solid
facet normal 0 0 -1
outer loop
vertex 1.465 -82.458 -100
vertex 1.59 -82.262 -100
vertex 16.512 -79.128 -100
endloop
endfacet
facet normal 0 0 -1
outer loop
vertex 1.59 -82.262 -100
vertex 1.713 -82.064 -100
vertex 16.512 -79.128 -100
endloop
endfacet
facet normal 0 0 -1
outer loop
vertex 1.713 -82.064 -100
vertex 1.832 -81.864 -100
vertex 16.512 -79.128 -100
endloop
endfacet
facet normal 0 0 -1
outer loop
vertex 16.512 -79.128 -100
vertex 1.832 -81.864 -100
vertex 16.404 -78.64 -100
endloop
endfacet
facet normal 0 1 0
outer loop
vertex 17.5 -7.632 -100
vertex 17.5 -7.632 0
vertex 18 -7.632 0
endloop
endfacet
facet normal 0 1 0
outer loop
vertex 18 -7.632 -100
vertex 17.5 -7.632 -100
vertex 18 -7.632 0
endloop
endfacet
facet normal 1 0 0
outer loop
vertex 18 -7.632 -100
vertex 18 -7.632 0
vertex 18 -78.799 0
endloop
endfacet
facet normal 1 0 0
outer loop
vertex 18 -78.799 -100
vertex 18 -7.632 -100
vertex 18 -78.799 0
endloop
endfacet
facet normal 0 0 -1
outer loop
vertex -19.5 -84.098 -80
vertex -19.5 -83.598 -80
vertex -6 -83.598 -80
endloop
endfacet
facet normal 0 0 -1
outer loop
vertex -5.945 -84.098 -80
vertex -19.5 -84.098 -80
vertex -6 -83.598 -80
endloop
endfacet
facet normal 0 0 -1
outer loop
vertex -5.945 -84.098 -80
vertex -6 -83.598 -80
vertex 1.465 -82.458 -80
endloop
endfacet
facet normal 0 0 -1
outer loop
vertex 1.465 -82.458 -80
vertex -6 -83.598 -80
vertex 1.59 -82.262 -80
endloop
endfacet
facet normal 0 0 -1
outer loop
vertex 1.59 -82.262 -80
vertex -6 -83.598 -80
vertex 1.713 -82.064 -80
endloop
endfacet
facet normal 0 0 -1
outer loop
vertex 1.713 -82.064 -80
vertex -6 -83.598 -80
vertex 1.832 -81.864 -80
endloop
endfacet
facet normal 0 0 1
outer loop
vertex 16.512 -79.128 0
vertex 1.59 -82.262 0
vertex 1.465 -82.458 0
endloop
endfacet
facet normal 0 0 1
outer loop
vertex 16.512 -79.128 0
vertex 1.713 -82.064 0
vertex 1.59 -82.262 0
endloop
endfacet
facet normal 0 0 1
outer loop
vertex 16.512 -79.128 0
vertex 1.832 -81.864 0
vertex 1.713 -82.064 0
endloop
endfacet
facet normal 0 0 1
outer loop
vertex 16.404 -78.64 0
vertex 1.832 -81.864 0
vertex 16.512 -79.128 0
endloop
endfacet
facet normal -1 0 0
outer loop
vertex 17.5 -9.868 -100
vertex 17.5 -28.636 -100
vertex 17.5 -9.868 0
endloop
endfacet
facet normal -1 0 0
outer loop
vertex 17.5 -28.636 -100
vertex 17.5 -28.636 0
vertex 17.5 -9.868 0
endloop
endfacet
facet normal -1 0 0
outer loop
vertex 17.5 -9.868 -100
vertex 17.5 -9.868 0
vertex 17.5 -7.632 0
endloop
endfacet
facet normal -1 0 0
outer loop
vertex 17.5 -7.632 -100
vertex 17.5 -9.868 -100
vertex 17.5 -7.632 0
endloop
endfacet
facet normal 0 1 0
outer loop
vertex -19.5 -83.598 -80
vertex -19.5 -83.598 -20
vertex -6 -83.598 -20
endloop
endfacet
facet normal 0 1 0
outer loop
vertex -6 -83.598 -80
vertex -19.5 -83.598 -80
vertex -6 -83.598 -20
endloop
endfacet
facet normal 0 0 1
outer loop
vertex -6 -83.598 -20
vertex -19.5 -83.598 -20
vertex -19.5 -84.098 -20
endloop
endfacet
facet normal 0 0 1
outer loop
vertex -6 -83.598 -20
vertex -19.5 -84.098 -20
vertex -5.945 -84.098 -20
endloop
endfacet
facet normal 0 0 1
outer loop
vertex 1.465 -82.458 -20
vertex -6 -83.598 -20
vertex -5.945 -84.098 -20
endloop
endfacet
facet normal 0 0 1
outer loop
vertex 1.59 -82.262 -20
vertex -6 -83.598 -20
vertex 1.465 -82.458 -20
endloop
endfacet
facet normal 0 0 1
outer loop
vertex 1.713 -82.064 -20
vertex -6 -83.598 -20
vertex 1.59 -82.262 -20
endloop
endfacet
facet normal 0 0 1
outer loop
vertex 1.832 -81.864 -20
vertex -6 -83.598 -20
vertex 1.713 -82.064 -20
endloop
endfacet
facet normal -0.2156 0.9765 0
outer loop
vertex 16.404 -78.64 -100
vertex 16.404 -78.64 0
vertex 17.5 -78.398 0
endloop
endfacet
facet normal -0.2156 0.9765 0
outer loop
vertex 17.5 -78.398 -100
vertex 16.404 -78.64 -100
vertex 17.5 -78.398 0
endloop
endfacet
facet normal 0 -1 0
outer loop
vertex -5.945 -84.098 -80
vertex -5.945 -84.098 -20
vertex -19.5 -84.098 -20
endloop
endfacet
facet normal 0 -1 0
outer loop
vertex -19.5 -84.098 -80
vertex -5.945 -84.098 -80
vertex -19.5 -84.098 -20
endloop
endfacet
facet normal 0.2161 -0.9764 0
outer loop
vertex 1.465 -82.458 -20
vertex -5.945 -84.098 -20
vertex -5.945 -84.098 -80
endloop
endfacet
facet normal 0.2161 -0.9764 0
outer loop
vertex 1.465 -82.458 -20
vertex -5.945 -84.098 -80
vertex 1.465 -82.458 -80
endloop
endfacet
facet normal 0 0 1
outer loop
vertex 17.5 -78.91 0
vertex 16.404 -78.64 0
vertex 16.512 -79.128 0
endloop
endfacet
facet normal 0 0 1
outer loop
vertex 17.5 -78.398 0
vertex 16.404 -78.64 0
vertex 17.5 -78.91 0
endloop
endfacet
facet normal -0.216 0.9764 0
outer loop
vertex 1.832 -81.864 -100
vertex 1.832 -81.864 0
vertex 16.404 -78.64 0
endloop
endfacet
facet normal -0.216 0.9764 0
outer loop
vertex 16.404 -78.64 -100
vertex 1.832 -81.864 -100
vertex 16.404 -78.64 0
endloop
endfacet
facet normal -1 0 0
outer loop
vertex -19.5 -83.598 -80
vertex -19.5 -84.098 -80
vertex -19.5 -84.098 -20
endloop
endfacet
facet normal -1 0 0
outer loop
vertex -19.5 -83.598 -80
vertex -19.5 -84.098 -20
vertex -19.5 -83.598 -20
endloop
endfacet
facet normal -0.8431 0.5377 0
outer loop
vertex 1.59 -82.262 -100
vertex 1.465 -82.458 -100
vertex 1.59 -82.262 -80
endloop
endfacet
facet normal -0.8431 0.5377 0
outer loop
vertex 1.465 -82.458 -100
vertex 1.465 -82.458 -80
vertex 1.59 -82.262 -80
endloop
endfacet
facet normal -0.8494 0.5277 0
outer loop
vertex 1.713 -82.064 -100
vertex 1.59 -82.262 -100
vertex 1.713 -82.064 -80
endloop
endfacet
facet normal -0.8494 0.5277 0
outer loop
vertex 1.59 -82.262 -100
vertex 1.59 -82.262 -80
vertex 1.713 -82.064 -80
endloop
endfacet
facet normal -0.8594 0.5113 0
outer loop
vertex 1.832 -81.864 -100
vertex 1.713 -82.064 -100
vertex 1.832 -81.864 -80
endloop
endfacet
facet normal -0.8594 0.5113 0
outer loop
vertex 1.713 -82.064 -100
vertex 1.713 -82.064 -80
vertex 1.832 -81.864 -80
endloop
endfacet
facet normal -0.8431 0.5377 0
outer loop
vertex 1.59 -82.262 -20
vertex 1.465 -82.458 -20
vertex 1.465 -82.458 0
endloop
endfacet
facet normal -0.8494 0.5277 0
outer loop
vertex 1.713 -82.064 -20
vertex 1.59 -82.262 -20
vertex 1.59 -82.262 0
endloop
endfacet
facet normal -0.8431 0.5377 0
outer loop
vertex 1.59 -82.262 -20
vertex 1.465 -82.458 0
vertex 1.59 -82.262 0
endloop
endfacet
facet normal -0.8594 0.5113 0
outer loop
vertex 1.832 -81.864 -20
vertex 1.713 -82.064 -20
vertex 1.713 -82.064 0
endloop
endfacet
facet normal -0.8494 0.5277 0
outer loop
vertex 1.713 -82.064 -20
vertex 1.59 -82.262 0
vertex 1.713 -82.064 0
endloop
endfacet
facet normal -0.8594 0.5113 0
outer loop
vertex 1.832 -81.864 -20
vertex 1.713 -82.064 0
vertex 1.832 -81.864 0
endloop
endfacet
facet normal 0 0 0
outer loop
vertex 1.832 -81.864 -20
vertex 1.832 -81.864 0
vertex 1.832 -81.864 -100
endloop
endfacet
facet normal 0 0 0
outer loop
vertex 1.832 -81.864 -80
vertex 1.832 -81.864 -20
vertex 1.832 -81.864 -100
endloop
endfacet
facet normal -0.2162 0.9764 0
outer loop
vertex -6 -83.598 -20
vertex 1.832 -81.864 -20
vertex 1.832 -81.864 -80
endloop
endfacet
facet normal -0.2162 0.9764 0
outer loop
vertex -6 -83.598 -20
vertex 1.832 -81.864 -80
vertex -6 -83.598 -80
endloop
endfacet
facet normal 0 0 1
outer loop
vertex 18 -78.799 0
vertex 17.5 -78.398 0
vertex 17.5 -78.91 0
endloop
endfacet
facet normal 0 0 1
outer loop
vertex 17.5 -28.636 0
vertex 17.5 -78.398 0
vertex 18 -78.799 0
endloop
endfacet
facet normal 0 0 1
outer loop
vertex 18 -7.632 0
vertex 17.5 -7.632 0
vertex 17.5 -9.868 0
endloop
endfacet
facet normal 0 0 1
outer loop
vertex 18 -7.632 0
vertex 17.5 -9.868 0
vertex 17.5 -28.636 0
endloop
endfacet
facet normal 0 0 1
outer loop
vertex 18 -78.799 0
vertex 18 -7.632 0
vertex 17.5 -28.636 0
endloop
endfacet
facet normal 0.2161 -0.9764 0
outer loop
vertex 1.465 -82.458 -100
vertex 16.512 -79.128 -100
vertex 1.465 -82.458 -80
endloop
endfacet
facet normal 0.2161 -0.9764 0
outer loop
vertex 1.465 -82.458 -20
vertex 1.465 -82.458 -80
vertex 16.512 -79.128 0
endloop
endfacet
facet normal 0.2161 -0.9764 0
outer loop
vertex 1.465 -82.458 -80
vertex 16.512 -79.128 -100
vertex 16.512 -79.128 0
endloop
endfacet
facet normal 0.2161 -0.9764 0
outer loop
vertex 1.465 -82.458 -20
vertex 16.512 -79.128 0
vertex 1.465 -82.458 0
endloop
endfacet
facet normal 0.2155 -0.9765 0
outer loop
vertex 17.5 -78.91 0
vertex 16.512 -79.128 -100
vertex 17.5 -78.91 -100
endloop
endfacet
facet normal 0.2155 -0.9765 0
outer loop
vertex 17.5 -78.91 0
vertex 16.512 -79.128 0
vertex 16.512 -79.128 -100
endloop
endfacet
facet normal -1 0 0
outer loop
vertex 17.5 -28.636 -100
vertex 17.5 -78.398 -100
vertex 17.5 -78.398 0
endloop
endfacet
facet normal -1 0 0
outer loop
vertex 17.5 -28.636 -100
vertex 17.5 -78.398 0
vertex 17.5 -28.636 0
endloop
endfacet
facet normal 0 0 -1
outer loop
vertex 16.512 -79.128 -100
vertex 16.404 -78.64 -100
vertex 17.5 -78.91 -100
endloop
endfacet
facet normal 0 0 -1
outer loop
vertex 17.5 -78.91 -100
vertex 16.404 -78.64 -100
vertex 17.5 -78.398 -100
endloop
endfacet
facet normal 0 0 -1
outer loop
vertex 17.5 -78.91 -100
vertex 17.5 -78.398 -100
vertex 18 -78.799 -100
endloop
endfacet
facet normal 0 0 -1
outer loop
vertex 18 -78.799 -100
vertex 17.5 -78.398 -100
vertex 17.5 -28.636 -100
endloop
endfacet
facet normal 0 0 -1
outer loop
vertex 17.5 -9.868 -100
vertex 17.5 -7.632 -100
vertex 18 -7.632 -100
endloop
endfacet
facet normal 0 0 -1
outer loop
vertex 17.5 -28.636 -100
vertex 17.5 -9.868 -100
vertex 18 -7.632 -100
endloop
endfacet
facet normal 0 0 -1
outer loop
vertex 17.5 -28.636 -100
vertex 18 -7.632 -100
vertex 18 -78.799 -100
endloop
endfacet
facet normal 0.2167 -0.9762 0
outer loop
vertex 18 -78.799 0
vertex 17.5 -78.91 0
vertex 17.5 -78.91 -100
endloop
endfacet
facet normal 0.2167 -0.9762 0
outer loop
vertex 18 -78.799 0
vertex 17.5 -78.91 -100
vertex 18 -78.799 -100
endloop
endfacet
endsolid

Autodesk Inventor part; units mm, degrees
ref_plane "YZ Plane" through (0, 0, 0) normal (1, 0, 0) x (0, 1, 0)
ref_plane "XZ Plane" through (0, 0, 0) normal (0, 1, 0) x (-1, 0, 0)
ref_plane "XY Plane" through (0, 0, 0) normal (0, 0, 1) x (1, 0, 0)
sketch "Sketch1" plane through (0, 0, 0) normal (0, 0, 1) x (1, 0, 0)
  line L0 (-17.5, 7.6319) -> (17.5, -9.8679) projected
  line L1 (17.5, -9.8679) -> (17.5, -7.6319) projected
  line L2 (17.5, -7.6319) -> (-17.5, 9.8679) projected
  line L3 (-17.5, 9.8679) -> (-17.5, 7.6319) projected
  line L4 (-7.5, -29.4219) -> (-3.6225, -29.4219) projected
  arc A0 (-1.9153, -30.38) -> (-3.6225, -29.4219) centre (-3.6225, -31.4219) ccw projected
  line L5 (-1.9153, -30.38) -> (2.2072, -37.135) projected
  arc A1 (2.5, -38.1769) -> (2.2072, -37.135) centre (0.5, -38.1769) ccw projected
  line L6 (2.5, -38.1769) -> (2.5, -47.4219) projected
  arc A2 (0.5, -49.4219) -> (2.5, -47.4219) centre (0.5, -47.4219) ccw projected
  line L7 (0.5, -49.4219) -> (-7.5, -49.4219) projected
  line L8 (-7.5, -49.4219) -> (-7.5, -29.4219) projected
  spline S0 degree 3 poles (6.0485, -14.3337) (6.0213, -14.5971) (5.9428, -14.8528) (5.6929, -15.3183) (5.524, -15.5241) (5.1467, -15.8339) (4.9505, -15.9462) (4.5292, -16.1007) (4.3073, -16.1418) (4.0832, -16.1449) knots 0 0 0 0 0.079442 0.079442 0.158531 0.158531 0.225919 0.225919 0.293184 0.293184 0.293184 0.293184 projected
  line L9 (6.0485, -14.3337) -> (6.563, -9.3583) projected
  line L10 (6.563, -9.3583) -> (6.8849, -5.9915) projected
  arc A3 (6.8849, -5.9915) -> (5.7884, -4.0122) centre (4.894, -5.8011) ccw projected
  line L11 (-17.5, 7.6319) -> (5.7884, -4.0122) projected
  line L12 (-17.5, -57.5975) -> (-17.5, 7.6319) projected
  arc A4 (-4.376, -58.868) -> (-17.5, -57.5975) centre (-12.5, -74.368) ccw projected
  arc A5 (1.8324, -81.8643) -> (-4.376, -58.868) centre (-12.5, -73.3975) ccw projected
  line L13 (17.5, -78.3975) -> (17.5, -28.6365) projected
  ellipse E0 centre (15.5, -28.6365) end of major axis (15.5, -26.6191) minor radius 2 (17.5, -28.6365) -> (15.6888, -26.6281) ccw projected
  line L14 (15.6888, -26.6281) -> (3.1949, -25.4333) projected
  line L15 (3.1949, -25.4333) -> (4.0832, -16.1449) projected
  circle A6 centre (12, -52.3461) radius 1.25 projected
  circle A7 centre (-5.3255, -52.3461) radius 1.25 projected
  line L16 (14, -34.918) -> (10, -34.918) projected
  line L17 (14, -41.318) -> (14, -34.918) projected
  line L18 (10, -41.318) -> (14, -41.318) projected
  line L19 (10, -34.918) -> (10, -41.318) projected
  line L20 (-13.7851, -31.6782) -> (-9.7851, -31.6782) projected
  line L21 (-13.7851, -25.2782) -> (-13.7851, -31.6782) projected
  line L22 (-9.7851, -25.2782) -> (-13.7851, -25.2782) projected
  line L23 (-9.7851, -31.6782) -> (-9.7851, -25.2782) projected
  circle A8 centre (-7.1425, -17.0027) radius 1.25 projected
  line L24 (-19.5, -83.5975) -> (-17.5, -83.5975) projected
  line L25 (-17.5, -57.5975) -> (-17.5, -83.5975) projected
  line L26 (-19.5, -57.5975) -> (-17.5, -57.5975) projected
  line L27 (-19.5, -57.5975) -> (-19.5, -83.5975) projected
  line L28 (-12.5, -83.5975) -> (-17.5, -83.5975) projected
  arc A9 (-12.5, -83.5975) -> (-6.9024, -81.9243) centre (-12.5, -73.3975) ccw projected
  line L29 (17.5, -7.6319) -> (18, -7.6319)
  line L30 (18, -7.6319) -> (18, -79.7438)
  line L31 (18, -79.7438) -> (17.5, -79.7438)
  line L32 (17.5, -79.7438) -> (17.5, -7.6319)
  line L33 (-6, -67.7722) -> (-6, -79.3975) projected
  line L34 (-12.5, -83.5975) -> (-17.5, -83.5975) projected
  arc A10 (-12.5, -83.5975) -> (-6.9024, -81.9243) centre (-12.5, -73.3975) ccw projected
  arc A11 (-6.9024, -81.9243) -> (-6, -80.2524) centre (-8, -80.2524) ccw projected
  line L35 (-6, -79.3975) -> (-6, -67.7722) projected
  line L36 (-6, -80.2524) -> (-6, -79.3975) projected
  line L37 (-19.5, -83.5975) -> (-6, -83.5975)
  line L38 (-6, -83.5975) -> (-6, -84.0975)
  line L39 (-6, -84.0975) -> (-19.5, -84.0975)
  line L40 (-19.5, -84.0975) -> (-19.5, -83.5975)
  line L41 (-6, -83.5975) -> (17.5, -78.3975)
  line L42 (16.4042, -78.64) -> (16.5122, -79.1281)
  line L43 (-3.7701, -83.1041) -> (-3.6621, -83.5922)
  line L44 (16.5122, -79.1281) -> (-3.6621, -83.5922)
  line L45 (16.5122, -79.1281) -> (21.5032, -78.0238)
  line L46 (-3.6621, -83.5922) -> (-17.5, -86.6542)
  line L47 (-6, -84.0975) -> (-5.7395, -84.0975)
  circle A12 centre (-12.5, -73.3975) radius 16.6465
  line L48 (1.8324, -81.8643) -> (17.5, -78.3975) projected
  point P0 (0, 0)
  point P1 (1.8324, -81.8643)
  point P2 (1.4649, -82.4578)
  point P3 (18, -78.7989)
  dimension "d0" = 0.5
  dimension "d1" = 0.5
  dimension "d4" = 0.5
  dimension "d5" = 0.5
extrude "Extrusion1" add sketch "Sketch1" against normal blind 100 contours L1 L29 L30 L45 L32 L13 | L32 L45 L42 L41 | L41 L42 L44 A12
ref_plane "Work Plane1" through (-19.5, -57.5975, -20) normal (0, 0, 1) x (1, 0, 0)
sketch "Sketch2" plane through (-19.5, -57.5975, -20) normal (0, 0, 1) x (1, 0, 0)
  line L0 (0, -26) -> (2, -26) projected
  line L1 (2, 0) -> (2, -26) projected
  line L2 (0, 0) -> (2, 0) projected
  line L3 (0, 0) -> (0, -26) projected
  line L4 (7, -26) -> (2, -26) projected
  arc A0 (7, -26) -> (12.5976, -24.3269) centre (7, -15.8) ccw projected
  line L5 (13.5, -21.8) -> (13.5, -10.1747) projected
  line L6 (0, -26) -> (13.5546, -26)
  line L7 (13.5546, -26) -> (13.5546, -26.5)
  line L8 (13.5546, -26.5) -> (0, -26.5)
  line L9 (0, -26.5) -> (0, -26)
  line L10 (37.5, -21.2015) -> (20.9649, -24.8603) projected
  line L11 (13.5546, -26.5) -> (20.9649, -24.8603)
  line L12 (20.9649, -24.8603) -> (37.5, -21.2015) projected
  line L13 (37.5, -21.2015) -> (37.5, 49.9656) projected
  line L14 (37.5, 49.9656) -> (37, 49.9656) projected
  line L15 (37, 49.9656) -> (37, -20.8) projected
  line L16 (37, -20.8) -> (21.3324, -24.2669) projected
  arc A1 (20.9649, -24.8603) -> (21.3324, -24.2669) centre (7, -15.8) ccw projected
  arc A2 (20.9649, -24.8603) -> (21.3324, -24.2669) centre (7, -15.8) ccw projected
  line L17 (21.3324, -24.2669) -> (13.5, -26)
  point P0 (19.5, 57.5975)
  dimension "d8" = 0.5
extrude "Extrusion2" add sketch "Sketch2" against normal blind 60 contours L0 L4 L6 L7 L8 L9 | L7 L6 L17 A1 L11
sketch "Sketch3" plane through (-19.5, -57.5975, -20) normal (0, 0, 1) x (1, 0, 0)
  line L0 (0, -26.5) -> (13.5546, -26.5) projected
  line L1 (13.5546, -26.5) -> (20.9649, -24.8603) projected
  arc A0 (20.9649, -24.8603) -> (21.3324, -24.2669) centre (7, -15.8) ccw projected
  line L2 (21.3324, -24.2669) -> (13.5, -26) projected
  line L3 (13.5, -26) -> (0, -26) projected
  line L4 (0, -26) -> (0, -26.5) projected
  point P0 (19.5, 57.5975)
  dimension "d11" = 167.523
properties part number "pokrywa" material "Aluminum 6061"
